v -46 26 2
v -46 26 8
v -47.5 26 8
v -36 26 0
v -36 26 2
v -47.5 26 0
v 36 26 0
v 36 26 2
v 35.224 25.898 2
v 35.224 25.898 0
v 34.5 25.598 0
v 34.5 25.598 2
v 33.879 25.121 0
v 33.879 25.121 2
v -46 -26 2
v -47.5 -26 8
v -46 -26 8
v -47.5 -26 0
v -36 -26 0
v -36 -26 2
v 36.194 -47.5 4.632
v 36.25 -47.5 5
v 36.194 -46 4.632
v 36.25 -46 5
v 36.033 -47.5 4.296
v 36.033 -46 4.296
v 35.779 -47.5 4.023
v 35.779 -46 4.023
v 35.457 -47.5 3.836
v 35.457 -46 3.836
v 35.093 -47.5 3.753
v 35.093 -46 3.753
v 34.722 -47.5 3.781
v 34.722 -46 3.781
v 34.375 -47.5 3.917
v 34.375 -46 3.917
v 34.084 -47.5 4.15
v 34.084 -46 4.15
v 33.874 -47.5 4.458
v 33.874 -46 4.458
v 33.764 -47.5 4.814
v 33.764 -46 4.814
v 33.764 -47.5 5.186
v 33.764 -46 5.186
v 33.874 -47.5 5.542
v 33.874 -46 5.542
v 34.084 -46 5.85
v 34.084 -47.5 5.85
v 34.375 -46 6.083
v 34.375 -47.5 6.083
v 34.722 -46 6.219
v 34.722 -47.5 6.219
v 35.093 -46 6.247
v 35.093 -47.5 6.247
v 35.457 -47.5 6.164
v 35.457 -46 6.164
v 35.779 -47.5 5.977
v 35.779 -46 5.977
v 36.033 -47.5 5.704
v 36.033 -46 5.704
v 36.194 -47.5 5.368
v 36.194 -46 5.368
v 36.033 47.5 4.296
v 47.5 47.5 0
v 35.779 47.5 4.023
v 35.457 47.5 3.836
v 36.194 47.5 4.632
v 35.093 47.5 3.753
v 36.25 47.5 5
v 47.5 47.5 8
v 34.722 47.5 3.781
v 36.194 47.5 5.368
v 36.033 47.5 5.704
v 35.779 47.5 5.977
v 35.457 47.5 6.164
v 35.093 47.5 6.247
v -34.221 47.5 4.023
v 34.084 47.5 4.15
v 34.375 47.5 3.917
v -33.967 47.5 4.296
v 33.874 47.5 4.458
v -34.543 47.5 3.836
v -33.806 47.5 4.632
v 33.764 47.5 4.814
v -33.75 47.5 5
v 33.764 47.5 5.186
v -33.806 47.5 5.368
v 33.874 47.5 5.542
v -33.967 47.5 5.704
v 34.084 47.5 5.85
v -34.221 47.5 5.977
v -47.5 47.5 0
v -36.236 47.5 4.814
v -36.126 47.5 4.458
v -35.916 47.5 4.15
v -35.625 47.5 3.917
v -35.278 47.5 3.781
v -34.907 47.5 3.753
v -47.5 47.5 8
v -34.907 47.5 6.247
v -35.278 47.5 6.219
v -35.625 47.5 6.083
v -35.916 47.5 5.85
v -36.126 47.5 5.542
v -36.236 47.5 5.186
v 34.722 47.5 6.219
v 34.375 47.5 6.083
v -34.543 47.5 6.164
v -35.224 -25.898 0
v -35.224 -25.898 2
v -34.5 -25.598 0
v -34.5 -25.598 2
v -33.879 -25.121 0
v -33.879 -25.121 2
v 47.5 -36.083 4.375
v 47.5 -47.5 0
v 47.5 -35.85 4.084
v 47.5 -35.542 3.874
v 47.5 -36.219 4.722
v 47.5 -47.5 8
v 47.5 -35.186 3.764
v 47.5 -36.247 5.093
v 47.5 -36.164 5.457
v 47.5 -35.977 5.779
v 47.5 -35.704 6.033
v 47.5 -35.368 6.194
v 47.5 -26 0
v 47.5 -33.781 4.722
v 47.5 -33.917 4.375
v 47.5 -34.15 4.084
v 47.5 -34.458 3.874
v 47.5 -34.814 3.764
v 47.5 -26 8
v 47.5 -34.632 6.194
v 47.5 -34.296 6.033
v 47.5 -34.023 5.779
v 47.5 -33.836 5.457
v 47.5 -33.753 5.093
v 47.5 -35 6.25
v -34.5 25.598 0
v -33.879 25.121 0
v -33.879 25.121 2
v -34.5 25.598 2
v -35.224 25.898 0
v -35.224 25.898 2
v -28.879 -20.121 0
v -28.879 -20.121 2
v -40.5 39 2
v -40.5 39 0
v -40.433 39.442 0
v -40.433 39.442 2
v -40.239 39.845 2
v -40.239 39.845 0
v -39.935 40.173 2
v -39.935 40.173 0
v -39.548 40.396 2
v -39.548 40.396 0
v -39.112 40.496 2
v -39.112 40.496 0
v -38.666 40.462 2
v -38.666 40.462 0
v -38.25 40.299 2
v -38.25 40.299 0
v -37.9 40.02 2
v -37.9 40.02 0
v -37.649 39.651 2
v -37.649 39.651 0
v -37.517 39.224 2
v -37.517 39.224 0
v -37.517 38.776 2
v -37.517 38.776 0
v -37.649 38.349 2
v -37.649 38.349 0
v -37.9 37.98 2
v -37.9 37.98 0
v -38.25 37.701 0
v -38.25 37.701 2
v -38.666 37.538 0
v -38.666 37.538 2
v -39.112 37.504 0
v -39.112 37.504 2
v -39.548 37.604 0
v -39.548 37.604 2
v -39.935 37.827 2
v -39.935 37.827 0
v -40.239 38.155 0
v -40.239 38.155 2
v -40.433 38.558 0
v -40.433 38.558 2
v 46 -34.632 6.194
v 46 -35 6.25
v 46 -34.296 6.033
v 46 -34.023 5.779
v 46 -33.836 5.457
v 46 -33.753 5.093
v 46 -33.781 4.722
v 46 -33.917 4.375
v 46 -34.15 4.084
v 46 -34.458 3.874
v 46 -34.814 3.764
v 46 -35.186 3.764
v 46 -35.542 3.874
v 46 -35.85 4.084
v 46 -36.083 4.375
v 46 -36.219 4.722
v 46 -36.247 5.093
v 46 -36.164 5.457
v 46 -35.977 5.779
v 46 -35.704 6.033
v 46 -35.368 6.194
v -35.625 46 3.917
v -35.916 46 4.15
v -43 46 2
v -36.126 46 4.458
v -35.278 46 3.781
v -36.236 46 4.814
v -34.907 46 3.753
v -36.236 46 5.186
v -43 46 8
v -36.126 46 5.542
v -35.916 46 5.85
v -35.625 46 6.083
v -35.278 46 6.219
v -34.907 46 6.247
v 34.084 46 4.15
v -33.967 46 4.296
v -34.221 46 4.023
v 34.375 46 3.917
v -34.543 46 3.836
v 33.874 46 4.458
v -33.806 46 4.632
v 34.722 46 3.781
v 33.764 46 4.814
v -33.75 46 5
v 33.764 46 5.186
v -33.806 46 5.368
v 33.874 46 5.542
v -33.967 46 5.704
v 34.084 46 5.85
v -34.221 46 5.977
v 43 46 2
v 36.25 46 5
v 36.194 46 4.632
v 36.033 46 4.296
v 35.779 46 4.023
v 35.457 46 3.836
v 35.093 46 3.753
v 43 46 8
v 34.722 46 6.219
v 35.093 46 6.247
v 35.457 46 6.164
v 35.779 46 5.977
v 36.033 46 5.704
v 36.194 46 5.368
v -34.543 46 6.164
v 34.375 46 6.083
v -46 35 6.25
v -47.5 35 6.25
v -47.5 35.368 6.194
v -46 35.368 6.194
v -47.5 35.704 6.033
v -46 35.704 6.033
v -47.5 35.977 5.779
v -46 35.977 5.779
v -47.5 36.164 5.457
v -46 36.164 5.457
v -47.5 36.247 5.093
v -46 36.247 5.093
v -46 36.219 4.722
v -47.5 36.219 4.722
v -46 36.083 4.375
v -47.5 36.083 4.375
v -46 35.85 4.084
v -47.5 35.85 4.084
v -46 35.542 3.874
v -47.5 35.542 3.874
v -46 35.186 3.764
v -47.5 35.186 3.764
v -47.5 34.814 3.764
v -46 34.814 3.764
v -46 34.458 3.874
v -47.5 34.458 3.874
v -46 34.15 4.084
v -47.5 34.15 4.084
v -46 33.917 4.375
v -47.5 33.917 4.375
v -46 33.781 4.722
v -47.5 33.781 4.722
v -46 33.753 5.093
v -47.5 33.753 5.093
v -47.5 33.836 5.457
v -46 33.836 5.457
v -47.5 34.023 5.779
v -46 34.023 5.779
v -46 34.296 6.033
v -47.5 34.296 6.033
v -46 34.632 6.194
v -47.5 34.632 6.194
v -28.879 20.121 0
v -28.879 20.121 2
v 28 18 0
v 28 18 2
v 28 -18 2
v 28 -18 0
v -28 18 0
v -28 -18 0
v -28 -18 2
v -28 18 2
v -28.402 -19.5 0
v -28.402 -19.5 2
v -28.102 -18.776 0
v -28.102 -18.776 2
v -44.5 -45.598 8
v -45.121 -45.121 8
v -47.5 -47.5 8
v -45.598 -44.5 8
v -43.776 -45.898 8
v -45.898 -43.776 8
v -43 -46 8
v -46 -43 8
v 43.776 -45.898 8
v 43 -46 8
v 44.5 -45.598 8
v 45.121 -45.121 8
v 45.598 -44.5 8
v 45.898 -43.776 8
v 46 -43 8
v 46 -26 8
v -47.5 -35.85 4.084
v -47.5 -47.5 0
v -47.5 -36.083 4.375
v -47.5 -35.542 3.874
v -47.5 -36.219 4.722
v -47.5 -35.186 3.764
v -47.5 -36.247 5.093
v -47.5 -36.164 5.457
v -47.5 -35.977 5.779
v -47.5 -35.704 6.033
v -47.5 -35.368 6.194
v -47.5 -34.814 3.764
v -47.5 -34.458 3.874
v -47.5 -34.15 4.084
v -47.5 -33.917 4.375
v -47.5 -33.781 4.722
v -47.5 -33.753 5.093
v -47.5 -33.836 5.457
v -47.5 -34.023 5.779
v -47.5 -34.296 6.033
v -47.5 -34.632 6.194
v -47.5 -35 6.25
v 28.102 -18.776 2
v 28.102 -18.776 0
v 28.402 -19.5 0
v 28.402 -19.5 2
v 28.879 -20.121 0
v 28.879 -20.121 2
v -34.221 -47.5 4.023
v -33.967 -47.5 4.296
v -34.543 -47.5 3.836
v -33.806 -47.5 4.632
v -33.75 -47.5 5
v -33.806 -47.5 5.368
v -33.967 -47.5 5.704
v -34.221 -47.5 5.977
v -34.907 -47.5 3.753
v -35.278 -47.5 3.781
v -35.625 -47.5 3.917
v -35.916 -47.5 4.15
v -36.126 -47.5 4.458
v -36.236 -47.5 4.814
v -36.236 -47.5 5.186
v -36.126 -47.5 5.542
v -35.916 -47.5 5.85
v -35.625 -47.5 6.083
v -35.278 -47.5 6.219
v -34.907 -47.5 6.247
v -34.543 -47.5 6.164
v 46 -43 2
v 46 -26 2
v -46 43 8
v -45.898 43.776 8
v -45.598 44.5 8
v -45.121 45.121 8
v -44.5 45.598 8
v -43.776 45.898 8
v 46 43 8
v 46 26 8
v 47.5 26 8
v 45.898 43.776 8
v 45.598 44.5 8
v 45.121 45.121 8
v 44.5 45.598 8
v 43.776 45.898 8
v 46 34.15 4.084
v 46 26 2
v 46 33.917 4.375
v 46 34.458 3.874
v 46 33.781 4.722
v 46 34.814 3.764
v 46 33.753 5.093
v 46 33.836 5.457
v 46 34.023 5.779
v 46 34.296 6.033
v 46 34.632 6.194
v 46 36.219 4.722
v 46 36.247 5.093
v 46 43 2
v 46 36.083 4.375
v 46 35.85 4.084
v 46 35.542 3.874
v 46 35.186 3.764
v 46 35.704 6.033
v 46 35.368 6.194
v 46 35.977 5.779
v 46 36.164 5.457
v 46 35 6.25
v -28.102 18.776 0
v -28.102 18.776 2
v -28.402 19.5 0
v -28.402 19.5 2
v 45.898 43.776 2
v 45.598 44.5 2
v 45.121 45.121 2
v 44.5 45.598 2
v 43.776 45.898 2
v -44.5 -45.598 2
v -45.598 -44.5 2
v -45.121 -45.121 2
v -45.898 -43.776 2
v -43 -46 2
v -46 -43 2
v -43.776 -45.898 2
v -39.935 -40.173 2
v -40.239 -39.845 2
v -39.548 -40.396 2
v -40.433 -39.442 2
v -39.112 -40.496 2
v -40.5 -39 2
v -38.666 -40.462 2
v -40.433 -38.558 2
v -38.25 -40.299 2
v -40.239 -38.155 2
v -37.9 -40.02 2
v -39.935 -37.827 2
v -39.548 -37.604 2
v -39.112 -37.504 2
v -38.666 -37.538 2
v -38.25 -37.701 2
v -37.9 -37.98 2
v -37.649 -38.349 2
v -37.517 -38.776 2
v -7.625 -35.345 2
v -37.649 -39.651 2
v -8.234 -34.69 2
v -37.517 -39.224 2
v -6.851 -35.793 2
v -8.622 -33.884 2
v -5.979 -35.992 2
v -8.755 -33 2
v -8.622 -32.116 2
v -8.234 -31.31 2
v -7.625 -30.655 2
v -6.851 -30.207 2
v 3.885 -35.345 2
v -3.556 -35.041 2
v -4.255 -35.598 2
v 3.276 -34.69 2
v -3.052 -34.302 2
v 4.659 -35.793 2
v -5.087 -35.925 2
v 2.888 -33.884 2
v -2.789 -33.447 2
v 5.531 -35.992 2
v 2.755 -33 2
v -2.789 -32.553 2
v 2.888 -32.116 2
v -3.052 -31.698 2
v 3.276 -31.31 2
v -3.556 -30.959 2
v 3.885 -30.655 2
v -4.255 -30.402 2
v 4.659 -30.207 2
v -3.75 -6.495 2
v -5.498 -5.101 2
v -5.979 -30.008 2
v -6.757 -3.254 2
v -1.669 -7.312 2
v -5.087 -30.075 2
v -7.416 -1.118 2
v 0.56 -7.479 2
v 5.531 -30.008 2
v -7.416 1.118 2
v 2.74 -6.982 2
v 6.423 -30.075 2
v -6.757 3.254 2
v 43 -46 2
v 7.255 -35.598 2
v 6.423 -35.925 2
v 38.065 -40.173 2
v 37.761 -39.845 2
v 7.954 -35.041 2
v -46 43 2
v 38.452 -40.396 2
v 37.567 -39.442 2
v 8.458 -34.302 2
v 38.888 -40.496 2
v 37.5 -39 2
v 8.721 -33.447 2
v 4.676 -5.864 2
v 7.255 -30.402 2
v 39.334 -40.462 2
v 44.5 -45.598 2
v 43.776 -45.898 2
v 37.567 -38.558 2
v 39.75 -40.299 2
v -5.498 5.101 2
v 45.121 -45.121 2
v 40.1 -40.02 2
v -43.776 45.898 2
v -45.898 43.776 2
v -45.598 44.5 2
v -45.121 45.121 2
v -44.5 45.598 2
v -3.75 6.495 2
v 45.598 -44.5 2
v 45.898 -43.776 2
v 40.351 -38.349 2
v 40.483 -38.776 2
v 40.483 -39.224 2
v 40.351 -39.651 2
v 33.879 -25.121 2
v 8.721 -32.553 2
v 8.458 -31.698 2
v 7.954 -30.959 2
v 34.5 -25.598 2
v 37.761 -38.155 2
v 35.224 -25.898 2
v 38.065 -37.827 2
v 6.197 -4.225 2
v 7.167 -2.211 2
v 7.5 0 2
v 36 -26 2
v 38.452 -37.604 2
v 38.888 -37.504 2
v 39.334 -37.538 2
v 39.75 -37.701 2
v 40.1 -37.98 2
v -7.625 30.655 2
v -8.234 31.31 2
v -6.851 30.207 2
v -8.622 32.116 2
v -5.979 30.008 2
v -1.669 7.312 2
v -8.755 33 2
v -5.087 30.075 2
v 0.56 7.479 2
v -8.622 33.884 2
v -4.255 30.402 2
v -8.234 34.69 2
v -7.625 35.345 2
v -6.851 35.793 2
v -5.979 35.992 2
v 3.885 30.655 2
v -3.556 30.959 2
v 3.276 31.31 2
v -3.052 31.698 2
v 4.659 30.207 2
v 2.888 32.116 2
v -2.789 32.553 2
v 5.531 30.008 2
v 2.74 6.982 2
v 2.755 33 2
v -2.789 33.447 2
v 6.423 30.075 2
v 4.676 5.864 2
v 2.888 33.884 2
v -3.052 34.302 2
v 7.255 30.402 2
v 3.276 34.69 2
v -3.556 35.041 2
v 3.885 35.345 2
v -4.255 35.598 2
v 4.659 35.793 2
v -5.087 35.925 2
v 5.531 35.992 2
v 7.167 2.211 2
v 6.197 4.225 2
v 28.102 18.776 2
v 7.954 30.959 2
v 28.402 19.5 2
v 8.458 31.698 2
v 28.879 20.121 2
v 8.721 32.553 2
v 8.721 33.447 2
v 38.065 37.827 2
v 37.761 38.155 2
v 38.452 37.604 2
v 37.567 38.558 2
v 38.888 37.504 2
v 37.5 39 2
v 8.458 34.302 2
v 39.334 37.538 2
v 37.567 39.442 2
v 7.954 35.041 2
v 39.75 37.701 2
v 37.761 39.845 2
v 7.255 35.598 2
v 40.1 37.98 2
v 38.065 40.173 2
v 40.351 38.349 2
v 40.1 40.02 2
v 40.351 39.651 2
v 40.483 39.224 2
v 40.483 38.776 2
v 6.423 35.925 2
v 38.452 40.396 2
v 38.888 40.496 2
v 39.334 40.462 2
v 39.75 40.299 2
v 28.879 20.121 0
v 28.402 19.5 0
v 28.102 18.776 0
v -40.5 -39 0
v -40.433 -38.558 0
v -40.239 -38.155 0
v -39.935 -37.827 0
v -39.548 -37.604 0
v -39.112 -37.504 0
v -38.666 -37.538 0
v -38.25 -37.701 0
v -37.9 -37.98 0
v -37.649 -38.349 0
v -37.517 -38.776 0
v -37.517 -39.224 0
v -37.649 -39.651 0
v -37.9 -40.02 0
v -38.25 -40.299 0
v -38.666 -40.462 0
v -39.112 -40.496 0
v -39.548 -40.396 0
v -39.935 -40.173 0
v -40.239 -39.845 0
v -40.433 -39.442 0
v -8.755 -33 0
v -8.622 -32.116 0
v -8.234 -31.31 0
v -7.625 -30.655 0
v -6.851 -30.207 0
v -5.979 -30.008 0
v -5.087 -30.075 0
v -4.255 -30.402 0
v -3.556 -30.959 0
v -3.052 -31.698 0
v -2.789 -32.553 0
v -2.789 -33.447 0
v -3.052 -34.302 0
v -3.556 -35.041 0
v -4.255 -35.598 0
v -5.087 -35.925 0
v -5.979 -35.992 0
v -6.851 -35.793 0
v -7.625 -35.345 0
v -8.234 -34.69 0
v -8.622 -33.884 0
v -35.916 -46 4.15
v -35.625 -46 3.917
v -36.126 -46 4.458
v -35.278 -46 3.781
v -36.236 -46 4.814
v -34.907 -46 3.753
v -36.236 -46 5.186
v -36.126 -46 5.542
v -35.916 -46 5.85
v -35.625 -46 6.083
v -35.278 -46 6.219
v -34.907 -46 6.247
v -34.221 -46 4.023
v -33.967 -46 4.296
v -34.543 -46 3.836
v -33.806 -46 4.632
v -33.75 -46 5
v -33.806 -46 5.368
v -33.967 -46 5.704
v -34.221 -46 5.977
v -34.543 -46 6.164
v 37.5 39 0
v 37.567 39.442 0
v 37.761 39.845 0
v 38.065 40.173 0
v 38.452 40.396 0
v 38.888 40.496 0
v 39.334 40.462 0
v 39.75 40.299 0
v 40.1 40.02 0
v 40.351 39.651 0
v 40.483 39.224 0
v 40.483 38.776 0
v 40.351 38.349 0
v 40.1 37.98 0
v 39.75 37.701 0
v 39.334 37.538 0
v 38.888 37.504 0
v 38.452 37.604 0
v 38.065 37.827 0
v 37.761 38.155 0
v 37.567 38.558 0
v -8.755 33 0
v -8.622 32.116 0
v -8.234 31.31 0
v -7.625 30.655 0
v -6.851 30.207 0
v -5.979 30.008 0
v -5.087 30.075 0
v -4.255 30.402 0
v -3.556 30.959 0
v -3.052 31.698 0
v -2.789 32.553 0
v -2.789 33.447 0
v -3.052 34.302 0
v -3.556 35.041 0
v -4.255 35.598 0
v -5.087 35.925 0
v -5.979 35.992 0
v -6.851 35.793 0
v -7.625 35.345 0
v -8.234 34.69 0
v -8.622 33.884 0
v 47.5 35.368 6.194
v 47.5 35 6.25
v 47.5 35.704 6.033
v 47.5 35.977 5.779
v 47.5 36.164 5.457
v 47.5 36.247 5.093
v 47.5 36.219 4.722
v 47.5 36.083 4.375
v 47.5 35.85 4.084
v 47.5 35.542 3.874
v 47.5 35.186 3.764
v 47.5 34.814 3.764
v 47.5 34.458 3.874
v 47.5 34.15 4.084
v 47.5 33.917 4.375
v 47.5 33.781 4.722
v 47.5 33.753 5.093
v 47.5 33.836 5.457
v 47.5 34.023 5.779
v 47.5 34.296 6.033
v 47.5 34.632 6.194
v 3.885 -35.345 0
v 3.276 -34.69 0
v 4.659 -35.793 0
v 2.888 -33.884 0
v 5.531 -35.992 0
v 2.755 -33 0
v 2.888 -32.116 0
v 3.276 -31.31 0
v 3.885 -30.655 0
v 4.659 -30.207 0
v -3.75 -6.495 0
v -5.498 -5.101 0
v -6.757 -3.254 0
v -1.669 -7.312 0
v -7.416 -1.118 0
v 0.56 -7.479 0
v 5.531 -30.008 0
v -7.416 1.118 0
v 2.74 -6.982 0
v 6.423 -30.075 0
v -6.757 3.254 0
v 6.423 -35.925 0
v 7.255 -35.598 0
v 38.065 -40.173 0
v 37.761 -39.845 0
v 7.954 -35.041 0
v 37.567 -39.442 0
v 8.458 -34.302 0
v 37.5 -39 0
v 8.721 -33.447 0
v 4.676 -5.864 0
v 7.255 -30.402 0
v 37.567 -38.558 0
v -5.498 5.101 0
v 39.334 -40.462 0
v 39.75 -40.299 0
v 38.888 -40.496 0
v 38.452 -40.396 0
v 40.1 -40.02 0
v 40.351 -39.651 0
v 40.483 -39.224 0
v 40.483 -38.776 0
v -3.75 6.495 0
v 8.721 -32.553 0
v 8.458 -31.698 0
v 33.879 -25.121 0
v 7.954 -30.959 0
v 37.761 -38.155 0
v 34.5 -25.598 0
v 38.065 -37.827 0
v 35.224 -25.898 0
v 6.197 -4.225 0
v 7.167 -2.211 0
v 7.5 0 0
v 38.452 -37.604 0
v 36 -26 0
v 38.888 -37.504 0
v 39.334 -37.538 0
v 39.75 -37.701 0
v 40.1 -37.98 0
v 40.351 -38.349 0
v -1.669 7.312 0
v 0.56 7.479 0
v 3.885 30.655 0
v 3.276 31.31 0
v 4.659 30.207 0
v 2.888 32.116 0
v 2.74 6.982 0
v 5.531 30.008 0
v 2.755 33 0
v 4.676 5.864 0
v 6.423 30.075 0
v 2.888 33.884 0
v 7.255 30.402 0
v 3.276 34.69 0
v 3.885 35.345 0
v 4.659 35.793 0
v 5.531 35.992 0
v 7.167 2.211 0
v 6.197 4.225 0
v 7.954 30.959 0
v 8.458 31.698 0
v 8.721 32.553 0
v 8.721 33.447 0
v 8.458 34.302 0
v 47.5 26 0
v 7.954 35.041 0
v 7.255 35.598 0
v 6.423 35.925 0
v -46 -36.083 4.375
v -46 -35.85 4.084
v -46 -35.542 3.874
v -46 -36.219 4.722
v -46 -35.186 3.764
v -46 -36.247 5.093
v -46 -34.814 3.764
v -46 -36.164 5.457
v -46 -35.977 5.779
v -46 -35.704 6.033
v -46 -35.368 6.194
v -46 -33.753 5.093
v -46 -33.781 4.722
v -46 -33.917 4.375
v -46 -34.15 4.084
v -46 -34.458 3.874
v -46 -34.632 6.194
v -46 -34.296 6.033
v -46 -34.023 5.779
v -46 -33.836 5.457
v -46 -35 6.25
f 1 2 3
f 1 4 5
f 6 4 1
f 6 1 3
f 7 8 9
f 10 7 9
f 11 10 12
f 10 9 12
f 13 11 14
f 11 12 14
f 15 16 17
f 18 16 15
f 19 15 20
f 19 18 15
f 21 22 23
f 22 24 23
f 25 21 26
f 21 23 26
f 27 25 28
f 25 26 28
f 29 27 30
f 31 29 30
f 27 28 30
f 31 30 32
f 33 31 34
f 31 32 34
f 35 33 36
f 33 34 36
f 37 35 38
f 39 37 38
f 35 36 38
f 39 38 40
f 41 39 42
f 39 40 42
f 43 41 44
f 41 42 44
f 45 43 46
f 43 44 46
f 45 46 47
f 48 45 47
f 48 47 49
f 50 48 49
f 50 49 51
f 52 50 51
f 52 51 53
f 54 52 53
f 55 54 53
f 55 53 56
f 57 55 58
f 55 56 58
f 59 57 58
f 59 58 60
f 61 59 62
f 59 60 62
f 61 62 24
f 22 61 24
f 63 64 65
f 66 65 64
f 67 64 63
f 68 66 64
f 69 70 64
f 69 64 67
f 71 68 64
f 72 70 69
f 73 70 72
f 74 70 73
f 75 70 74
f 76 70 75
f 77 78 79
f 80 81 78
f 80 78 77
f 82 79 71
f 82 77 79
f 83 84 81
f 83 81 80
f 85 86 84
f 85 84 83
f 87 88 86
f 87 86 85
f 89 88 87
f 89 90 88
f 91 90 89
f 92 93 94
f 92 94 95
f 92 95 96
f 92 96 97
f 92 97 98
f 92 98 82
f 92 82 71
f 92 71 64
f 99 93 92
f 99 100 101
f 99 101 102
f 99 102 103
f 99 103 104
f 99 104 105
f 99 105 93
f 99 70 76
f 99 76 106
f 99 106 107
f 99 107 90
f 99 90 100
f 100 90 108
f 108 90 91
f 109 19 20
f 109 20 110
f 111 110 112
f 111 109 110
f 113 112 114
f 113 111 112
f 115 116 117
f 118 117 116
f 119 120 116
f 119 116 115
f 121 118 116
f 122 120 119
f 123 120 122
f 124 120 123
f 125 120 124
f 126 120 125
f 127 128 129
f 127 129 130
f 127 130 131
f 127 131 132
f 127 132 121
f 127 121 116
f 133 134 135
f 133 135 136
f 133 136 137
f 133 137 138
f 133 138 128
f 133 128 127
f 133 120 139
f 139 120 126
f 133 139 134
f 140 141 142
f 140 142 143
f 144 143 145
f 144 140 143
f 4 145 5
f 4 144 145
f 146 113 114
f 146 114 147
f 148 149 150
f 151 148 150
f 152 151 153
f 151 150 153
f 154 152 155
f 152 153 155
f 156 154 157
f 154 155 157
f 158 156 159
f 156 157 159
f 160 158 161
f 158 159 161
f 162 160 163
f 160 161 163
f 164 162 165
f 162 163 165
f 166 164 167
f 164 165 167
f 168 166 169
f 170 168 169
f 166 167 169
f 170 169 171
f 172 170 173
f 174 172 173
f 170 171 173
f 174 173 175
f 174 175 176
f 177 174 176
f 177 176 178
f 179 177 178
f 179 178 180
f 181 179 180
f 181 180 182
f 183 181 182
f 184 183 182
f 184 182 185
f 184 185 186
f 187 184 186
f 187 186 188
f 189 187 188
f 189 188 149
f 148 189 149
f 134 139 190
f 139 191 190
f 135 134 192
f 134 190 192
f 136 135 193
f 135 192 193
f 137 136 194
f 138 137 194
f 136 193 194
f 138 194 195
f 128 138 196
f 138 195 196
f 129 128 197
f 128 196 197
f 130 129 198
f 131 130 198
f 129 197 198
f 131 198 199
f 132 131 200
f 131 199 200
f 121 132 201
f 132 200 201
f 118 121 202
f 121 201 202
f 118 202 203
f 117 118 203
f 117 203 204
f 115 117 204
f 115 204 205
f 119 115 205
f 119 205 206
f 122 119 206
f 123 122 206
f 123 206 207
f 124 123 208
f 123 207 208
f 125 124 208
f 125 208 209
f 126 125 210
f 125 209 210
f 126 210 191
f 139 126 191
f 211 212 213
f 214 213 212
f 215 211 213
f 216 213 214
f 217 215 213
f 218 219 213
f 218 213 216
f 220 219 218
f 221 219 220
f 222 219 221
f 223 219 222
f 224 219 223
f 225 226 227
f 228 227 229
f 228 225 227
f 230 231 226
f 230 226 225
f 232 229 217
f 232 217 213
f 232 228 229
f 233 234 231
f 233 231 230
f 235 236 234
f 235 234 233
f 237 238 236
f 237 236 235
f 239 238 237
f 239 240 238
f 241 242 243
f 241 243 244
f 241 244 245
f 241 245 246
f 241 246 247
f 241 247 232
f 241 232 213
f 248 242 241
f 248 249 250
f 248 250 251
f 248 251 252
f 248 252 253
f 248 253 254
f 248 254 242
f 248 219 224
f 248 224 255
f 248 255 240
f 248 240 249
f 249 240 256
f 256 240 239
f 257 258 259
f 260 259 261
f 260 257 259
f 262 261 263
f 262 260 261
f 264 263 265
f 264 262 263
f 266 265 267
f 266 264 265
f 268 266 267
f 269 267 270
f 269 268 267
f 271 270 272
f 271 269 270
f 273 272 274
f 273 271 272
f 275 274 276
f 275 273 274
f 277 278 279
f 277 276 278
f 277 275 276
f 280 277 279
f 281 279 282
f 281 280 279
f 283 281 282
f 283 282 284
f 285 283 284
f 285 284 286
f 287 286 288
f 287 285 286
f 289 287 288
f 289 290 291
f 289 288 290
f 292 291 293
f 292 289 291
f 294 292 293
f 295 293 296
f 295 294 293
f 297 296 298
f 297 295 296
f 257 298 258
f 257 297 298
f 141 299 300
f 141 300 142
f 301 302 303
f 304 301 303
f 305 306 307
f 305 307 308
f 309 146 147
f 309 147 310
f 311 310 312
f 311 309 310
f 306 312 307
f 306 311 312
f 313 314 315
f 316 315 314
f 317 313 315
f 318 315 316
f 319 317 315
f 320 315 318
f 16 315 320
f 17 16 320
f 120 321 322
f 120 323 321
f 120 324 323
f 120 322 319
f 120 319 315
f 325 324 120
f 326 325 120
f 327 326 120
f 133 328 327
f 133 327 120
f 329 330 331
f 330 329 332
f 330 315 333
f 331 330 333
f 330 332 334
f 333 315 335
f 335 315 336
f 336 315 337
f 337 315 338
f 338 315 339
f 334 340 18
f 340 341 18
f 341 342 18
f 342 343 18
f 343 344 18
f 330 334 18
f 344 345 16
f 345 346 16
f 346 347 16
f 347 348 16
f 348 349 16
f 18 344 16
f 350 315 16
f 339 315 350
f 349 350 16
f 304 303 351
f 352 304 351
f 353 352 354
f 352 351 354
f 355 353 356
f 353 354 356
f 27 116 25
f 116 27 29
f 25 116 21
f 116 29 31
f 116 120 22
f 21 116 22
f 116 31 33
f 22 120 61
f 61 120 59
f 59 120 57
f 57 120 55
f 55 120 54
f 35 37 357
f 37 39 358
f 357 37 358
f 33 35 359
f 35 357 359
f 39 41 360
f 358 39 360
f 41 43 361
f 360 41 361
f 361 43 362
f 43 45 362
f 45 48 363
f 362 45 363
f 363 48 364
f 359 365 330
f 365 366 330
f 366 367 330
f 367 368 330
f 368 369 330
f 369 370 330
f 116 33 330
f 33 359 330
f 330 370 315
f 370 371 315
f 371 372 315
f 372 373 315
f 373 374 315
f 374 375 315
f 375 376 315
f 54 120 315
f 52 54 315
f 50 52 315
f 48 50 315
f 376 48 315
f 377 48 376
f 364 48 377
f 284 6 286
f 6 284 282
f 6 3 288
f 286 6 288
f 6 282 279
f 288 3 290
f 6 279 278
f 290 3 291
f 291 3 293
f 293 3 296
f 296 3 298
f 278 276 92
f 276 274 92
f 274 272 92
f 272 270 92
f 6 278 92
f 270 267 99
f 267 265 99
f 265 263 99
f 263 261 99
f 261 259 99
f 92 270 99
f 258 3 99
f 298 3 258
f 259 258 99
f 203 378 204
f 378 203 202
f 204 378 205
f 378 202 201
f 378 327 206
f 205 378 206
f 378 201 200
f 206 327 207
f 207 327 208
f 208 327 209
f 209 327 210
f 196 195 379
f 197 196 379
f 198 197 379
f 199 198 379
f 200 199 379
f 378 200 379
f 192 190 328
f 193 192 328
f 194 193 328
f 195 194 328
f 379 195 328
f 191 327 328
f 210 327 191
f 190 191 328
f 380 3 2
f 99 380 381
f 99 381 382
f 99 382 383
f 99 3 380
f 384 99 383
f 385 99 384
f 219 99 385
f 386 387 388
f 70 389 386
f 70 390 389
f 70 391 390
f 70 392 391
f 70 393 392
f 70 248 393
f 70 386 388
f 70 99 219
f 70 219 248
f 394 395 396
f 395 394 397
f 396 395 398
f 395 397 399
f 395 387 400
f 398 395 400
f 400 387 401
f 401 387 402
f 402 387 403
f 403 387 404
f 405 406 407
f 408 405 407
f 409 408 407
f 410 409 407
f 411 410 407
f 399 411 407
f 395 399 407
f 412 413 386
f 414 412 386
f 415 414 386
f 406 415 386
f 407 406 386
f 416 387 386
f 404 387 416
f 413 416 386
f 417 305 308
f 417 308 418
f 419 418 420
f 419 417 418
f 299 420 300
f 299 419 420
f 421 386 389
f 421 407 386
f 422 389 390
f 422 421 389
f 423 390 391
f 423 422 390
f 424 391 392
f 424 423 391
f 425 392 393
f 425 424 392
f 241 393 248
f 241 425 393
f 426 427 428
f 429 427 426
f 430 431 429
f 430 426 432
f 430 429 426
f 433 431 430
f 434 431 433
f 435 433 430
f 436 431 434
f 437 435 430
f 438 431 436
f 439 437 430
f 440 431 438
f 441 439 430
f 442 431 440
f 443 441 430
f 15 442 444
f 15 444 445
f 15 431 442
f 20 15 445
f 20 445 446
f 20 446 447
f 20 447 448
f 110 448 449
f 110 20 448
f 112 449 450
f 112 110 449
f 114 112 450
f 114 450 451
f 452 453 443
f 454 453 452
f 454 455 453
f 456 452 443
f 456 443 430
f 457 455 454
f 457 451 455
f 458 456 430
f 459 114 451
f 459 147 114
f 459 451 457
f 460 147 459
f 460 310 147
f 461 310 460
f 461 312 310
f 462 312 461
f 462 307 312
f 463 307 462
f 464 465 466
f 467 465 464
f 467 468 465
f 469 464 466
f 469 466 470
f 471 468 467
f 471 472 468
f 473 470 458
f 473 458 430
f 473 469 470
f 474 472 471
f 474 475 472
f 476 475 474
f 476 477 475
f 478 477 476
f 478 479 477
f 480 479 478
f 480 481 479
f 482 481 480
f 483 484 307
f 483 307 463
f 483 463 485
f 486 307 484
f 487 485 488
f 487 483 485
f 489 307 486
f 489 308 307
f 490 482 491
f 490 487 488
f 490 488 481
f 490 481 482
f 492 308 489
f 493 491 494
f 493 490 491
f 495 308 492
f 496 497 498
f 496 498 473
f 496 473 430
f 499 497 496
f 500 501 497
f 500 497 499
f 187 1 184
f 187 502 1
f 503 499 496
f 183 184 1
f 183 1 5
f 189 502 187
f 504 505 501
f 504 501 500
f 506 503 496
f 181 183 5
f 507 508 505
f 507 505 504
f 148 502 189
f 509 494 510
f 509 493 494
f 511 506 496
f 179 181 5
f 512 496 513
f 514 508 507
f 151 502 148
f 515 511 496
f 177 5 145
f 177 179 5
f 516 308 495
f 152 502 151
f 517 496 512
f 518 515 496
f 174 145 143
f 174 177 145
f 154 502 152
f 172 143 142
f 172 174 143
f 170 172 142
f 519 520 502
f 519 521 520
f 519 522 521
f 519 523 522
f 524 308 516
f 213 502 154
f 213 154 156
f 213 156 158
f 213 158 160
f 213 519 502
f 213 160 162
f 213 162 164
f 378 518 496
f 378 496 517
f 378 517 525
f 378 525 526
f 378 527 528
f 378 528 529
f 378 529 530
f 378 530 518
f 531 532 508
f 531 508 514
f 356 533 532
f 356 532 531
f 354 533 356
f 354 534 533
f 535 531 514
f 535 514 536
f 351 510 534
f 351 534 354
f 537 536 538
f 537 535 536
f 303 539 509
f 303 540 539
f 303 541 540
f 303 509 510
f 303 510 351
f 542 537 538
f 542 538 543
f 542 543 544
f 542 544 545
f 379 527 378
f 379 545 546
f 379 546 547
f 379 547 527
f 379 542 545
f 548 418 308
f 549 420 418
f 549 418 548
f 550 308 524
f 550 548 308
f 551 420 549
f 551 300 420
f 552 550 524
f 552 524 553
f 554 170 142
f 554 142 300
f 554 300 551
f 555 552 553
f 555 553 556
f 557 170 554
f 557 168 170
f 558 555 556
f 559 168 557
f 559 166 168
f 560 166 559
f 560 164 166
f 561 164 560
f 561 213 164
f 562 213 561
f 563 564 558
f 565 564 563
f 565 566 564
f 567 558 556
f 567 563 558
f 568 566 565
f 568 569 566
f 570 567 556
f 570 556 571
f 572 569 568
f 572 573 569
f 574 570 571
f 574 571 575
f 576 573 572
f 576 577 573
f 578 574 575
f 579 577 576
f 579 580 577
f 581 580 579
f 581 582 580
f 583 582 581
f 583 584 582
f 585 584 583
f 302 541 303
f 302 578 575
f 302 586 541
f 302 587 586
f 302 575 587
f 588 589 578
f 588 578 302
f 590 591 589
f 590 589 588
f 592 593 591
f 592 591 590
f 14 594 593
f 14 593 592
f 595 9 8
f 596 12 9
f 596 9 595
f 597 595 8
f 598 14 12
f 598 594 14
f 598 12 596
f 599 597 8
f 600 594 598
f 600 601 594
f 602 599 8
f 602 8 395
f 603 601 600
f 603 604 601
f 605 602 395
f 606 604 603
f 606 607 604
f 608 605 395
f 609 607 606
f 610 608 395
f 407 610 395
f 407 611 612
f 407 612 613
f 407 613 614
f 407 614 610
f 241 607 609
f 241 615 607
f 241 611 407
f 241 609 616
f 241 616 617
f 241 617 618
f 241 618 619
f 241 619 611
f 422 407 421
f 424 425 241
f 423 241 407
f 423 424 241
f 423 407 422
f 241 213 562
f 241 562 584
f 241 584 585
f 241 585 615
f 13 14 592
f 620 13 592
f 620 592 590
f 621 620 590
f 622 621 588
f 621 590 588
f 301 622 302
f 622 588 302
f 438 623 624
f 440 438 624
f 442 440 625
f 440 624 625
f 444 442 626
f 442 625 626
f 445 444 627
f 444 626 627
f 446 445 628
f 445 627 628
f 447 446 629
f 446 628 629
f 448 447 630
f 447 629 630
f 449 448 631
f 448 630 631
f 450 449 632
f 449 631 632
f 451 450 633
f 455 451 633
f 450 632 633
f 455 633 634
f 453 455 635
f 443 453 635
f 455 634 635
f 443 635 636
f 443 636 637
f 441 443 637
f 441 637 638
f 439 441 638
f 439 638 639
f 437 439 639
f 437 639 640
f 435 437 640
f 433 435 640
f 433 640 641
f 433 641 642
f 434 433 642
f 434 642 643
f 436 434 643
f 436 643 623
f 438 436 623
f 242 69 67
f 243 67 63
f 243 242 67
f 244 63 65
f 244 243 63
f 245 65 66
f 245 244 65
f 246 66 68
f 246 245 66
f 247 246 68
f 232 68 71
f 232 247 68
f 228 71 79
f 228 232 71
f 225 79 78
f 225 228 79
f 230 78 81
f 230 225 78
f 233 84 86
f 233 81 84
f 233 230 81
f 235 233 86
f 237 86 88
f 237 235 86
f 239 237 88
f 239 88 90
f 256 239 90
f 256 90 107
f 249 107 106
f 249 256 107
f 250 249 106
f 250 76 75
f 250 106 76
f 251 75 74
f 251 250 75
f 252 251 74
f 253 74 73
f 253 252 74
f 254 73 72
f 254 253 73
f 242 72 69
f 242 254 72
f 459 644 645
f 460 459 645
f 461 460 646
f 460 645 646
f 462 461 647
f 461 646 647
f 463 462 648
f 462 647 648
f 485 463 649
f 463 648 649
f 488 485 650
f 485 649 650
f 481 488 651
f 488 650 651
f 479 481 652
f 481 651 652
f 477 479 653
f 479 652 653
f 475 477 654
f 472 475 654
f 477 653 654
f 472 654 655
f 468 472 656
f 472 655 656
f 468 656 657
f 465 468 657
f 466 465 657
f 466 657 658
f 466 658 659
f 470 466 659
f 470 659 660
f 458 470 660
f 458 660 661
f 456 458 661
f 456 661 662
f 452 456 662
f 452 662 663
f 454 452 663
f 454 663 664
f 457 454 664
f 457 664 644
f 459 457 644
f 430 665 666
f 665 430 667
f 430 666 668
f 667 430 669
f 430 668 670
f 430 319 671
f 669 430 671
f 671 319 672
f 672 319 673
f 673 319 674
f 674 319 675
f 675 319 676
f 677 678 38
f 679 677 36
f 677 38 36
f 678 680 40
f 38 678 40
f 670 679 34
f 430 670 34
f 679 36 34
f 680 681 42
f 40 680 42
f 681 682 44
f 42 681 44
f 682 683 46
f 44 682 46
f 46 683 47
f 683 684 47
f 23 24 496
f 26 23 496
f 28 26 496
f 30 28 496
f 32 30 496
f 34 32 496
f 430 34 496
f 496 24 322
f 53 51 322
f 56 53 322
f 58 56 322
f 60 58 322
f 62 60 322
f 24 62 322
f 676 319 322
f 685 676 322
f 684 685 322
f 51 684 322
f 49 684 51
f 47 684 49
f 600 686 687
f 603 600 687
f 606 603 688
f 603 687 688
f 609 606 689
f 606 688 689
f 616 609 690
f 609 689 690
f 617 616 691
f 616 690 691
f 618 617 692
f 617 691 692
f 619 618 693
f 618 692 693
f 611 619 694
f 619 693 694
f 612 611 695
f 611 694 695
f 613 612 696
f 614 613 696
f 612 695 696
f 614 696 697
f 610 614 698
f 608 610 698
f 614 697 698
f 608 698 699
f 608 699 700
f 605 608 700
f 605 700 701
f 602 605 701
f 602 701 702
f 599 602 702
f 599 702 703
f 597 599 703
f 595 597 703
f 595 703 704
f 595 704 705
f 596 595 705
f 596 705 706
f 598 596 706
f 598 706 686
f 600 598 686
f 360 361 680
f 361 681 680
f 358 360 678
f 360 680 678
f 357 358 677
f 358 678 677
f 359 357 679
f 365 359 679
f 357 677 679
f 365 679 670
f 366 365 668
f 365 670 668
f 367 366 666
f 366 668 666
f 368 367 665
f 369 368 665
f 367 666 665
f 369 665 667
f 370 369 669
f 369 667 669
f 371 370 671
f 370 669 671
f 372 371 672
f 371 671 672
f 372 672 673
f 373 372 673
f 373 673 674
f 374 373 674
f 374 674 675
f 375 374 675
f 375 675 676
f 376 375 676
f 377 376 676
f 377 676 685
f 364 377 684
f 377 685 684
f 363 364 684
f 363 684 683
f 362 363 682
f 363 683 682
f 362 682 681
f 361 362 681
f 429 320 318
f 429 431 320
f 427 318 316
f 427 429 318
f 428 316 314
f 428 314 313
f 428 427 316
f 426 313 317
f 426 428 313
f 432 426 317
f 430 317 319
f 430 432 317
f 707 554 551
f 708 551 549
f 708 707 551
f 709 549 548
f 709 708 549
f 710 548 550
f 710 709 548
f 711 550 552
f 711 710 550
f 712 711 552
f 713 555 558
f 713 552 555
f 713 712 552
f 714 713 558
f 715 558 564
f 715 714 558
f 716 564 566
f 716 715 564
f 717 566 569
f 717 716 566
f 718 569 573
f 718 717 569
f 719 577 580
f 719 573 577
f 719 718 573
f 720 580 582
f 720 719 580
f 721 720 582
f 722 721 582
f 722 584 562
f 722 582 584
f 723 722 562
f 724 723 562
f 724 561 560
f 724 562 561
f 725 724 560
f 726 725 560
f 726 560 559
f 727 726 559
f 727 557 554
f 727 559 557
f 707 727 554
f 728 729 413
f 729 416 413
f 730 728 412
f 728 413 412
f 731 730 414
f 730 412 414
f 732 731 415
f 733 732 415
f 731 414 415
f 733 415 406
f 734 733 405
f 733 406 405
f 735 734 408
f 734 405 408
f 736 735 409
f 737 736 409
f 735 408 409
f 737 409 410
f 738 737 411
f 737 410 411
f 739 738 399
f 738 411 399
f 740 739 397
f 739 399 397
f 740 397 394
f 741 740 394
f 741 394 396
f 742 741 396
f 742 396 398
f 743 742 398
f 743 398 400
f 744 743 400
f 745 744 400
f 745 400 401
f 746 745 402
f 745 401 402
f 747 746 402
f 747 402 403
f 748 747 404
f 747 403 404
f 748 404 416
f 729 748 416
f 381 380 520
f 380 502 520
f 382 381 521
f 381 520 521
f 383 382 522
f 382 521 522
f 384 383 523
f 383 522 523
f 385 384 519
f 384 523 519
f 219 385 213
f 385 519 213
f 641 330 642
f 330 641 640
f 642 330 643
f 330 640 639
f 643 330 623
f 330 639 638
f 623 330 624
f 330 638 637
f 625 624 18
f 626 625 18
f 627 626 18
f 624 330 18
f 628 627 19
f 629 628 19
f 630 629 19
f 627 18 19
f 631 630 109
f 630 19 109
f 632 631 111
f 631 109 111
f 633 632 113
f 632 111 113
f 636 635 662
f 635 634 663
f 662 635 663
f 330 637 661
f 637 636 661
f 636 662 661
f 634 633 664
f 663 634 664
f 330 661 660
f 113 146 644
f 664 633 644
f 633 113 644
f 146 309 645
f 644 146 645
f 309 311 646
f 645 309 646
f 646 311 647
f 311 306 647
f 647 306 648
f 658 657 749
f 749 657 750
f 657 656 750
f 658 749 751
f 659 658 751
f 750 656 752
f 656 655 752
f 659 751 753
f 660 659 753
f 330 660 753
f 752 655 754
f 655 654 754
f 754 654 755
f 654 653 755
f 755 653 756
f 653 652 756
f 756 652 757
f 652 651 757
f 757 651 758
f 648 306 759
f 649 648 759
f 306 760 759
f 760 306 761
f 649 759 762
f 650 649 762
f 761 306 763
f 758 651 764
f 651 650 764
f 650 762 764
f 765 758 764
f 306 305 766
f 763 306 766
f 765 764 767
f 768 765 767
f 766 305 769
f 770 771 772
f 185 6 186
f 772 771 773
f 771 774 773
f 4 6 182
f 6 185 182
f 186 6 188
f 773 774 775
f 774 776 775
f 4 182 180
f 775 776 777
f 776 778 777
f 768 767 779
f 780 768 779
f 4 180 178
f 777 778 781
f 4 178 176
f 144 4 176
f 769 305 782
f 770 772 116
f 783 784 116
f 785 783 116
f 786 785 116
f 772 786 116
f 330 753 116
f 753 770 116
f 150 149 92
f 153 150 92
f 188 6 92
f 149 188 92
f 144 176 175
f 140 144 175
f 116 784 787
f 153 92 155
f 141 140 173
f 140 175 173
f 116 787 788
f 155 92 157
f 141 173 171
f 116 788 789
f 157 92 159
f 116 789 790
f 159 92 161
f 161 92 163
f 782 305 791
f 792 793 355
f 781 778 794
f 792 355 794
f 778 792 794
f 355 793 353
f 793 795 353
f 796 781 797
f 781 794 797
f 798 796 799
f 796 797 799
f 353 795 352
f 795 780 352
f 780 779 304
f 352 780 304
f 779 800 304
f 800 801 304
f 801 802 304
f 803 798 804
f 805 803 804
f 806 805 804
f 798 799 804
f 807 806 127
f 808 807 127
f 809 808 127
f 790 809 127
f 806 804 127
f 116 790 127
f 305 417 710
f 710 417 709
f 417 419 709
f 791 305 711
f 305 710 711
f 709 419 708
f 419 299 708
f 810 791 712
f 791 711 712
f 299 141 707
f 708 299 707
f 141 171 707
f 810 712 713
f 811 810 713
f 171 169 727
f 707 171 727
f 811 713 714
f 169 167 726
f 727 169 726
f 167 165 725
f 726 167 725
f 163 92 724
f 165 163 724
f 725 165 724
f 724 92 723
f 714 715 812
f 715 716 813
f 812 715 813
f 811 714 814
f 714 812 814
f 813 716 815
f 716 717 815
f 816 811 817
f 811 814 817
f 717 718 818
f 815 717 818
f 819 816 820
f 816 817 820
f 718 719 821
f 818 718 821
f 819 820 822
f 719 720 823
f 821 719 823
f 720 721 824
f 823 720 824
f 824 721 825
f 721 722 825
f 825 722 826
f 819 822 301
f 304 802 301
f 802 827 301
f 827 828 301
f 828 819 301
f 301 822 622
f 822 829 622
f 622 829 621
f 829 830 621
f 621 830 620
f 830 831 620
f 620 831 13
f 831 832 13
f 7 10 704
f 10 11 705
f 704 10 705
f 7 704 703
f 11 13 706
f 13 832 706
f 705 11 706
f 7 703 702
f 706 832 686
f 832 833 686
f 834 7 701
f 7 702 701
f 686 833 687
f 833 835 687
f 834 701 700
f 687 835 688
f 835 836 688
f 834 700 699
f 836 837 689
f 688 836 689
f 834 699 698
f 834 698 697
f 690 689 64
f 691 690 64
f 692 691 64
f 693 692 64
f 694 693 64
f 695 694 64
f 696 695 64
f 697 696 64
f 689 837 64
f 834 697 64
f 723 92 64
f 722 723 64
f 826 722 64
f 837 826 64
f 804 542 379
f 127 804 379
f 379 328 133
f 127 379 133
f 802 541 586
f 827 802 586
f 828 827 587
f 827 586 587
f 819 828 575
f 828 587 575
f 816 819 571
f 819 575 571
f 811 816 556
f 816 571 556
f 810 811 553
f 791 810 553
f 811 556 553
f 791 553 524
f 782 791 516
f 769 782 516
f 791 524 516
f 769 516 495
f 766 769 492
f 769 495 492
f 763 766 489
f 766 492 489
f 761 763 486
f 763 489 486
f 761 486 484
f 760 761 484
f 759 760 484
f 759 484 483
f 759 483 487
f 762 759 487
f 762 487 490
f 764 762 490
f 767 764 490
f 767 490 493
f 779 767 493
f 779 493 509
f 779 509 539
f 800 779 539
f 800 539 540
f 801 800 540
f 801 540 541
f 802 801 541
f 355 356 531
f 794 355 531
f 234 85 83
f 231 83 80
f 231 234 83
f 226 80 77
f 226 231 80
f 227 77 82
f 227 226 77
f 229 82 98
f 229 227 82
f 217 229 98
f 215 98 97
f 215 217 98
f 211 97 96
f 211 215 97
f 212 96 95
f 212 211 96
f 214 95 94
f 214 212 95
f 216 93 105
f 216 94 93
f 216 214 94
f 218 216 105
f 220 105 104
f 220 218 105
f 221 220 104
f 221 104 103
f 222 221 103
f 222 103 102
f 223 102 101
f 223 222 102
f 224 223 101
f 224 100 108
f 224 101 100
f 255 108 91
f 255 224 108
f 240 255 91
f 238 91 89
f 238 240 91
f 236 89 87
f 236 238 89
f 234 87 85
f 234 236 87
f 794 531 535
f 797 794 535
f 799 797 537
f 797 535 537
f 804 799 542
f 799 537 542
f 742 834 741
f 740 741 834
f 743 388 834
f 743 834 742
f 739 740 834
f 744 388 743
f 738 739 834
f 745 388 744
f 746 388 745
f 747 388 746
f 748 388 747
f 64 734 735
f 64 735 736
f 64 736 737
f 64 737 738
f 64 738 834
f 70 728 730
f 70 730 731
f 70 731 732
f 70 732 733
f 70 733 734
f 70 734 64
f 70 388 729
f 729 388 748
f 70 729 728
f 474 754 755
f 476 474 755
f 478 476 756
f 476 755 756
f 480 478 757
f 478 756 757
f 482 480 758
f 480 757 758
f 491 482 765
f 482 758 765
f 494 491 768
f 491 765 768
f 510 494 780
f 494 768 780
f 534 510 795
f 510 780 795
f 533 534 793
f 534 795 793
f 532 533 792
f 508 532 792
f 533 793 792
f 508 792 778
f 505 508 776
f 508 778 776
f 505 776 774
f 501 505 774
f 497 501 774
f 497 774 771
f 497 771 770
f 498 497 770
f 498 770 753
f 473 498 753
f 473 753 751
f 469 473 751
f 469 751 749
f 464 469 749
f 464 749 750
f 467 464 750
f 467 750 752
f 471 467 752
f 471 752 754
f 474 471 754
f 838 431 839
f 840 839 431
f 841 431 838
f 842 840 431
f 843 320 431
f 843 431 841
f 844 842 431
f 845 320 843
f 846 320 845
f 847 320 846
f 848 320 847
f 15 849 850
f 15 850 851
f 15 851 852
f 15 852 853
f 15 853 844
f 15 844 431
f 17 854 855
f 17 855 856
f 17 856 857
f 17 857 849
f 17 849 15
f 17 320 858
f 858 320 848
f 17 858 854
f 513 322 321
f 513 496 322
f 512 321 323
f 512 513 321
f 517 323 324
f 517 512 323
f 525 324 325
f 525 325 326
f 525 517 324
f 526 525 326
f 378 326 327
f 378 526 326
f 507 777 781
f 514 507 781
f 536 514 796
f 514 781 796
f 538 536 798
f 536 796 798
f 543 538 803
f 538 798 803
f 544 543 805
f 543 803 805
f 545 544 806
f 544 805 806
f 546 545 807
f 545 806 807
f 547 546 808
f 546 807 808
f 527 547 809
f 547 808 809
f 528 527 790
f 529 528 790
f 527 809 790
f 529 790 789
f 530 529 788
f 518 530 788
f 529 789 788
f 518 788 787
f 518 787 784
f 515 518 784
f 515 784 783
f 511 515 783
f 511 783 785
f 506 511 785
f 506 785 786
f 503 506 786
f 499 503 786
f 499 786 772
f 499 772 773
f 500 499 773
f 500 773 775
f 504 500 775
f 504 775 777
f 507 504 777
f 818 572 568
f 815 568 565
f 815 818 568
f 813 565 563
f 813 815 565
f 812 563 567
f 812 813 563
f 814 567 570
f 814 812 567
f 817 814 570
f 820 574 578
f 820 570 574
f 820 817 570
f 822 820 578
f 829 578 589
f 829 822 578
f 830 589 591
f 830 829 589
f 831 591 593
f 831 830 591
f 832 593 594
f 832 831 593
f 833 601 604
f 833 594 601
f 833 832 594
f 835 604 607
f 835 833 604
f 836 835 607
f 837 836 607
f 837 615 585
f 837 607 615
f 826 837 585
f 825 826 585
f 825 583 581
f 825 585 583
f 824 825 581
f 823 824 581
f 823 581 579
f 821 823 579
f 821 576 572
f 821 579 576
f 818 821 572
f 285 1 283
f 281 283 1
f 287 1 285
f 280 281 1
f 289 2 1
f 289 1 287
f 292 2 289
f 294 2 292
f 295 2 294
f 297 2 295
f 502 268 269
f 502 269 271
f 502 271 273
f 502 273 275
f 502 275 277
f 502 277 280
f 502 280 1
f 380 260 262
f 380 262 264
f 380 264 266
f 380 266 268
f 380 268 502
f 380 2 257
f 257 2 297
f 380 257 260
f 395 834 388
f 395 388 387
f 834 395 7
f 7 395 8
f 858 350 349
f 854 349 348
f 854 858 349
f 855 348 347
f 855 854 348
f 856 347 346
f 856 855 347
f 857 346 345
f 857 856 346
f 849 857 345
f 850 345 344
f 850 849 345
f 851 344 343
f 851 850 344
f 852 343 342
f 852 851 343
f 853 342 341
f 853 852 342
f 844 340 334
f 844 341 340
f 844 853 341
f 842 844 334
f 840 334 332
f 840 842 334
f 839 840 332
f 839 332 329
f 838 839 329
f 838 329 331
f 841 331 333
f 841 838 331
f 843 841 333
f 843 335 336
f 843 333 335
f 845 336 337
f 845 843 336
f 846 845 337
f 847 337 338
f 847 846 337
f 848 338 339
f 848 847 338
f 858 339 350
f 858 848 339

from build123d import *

# Parameters (mm, degrees)
SKETCH1_W                       = 96
SKETCH1_H                       = 96
BOSS_EXTRUDE1_DEPTH             = 8
SKETCH2_W                       = 92
SKETCH2_H                       = 92
COMPONENT_PLATFORM_DEPTH        = 6
CABLE_SLOTS_DEPTH               = 6
SKETCH4_R                       = 7.5
CENTER_MASS_CUT_DEPTH           = 6
INNER_CORNER_FILLETS_R          = 3
TAP_DRILL_FOR_M3X0_5_TAP1_D     = 2.5
TAP_DRILL_FOR_M3X0_5_TAP1_DEPTH = 2
TAP_DRILL_FOR_M3X0_5_TAP2_D     = 2.5
TAP_DRILL_FOR_M3X0_5_TAP2_DEPTH = 2
F_3_0MM_DOWEL_HOLE3_D           = 3
F_3_0MM_DOWEL_HOLE3_DEPTH       = 10
F_3_0MM_DOWEL_HOLE3_TIP         = 0.901290929
CUT_EXTRUDE1_START              = -8
SKETCH16_OUTSIDE_W              = 125.2
SKETCH16_OUTSIDE_H              = 125.2
SKETCH16_OUTSIDE_W_2            = 95
SKETCH16_OUTSIDE_H_2            = 95
CUT_EXTRUDE1_DEPTH              = 8
SKETCH17_R                      = 3
CUT_EXTRUDE3_DEPTH              = 9


with BuildPart() as part:
    # Sketch1 → Boss-Extrude1 (new body)
    with BuildSketch(Plane.XY):
        Rectangle(SKETCH1_W, SKETCH1_H)
    extrude(amount=BOSS_EXTRUDE1_DEPTH)

    # Sketch2 → Component Platform (cut)
    with BuildSketch(Plane.XY.offset(8)):
        Rectangle(SKETCH2_W, SKETCH2_H)
    extrude(amount=-COMPONENT_PLATFORM_DEPTH, mode=Mode.SUBTRACT)

    # Sketch3 → Cable Slots (cut, symmetric)
    with BuildSketch(Plane.XY.offset(2)):
        with BuildLine():
            Line((-33.878679656, -25.121320344), (-28.878679656, -20.121320344))
            ThreePointArc((-28.878679656, -20.121320344), (-28.228361402, -19.148050297), (-28, -18))
            Line((-28, -18), (-28, 18))
            ThreePointArc((-28, 18), (-28.228361402, 19.148050297), (-28.878679656, 20.121320344))
            Line((-28.878679656, 20.121320344), (-33.878679656, 25.121320344))
            ThreePointArc((-33.878679656, 25.121320344), (-34.851949703, 25.771638598), (-36, 26))
            Line((-36, 26), (-48, 26))
            Line((-48, 26), (-48, -26))
            Line((-48, -26), (-36, -26))
            ThreePointArc((-36, -26), (-34.851949703, -25.771638598), (-33.878679656, -25.121320344))
        make_face()
        with BuildLine():
            Line((48, -26), (48, 26))
            Line((48, 26), (36, 26))
            ThreePointArc((36, 26), (34.851949703, 25.771638598), (33.878679656, 25.121320344))
            Line((33.878679656, 25.121320344), (28.878679656, 20.121320344))
            ThreePointArc((28.878679656, 20.121320344), (28.228361402, 19.148050297), (28, 18))
            Line((28, 18), (28, -18))
            ThreePointArc((28, -18), (28.228361402, -19.148050297), (28.878679656, -20.121320344))
            Line((28.878679656, -20.121320344), (33.878679656, -25.121320344))
            ThreePointArc((33.878679656, -25.121320344), (34.851949703, -25.771638598), (36, -26))
            Line((36, -26), (48, -26))
        make_face()
    extrude(amount=CABLE_SLOTS_DEPTH, both=True, mode=Mode.SUBTRACT)

    # Sketch4 → Center Mass Cut (cut)
    with BuildSketch(Plane.XY.offset(2)):
        Circle(SKETCH4_R)
    extrude(amount=-CENTER_MASS_CUT_DEPTH, mode=Mode.SUBTRACT)

    # Inner Corner Fillets
    inner_corner_fillets_edges = [part.edges().sort_by_distance(p)[0] for p in [
        (-46, -46, 5),
        (-46, 46, 5),
        (46, 46, 5),
        (46, -46, 5),
    ]]
    fillet(inner_corner_fillets_edges, radius=INNER_CORNER_FILLETS_R)

    # Tap Drill for M3x0.5 Tap1
    with Locations(Plane(origin=(0, -48, 0), x_dir=(-1, 0, 0), z_dir=(0, -1, 0))):
        with Locations((35, -5), (-35, -5)):
            tap_drill_for_m3x0_5_tap1 = Hole(TAP_DRILL_FOR_M3X0_5_TAP1_D / 2, depth=TAP_DRILL_FOR_M3X0_5_TAP1_DEPTH)

    # Tap Drill for M3x0.5 Tap2
    with Locations(Plane(origin=(48, 0, 0), x_dir=(0, 0, -1), z_dir=(1, 0, 0))):
        with Locations((-5, -35), (-5, 35)):
            tap_drill_for_m3x0_5_tap2 = Hole(TAP_DRILL_FOR_M3X0_5_TAP2_D / 2, depth=TAP_DRILL_FOR_M3X0_5_TAP2_DEPTH)

    # Mirror1: Tap Drill for M3x0.5 Tap1 across plane
    add(tap_drill_for_m3x0_5_tap1.mirror(Plane(origin=(0, 0, 0), x_dir=(0, 0, 1), z_dir=(0, -1, 0))), mode=Mode.SUBTRACT)

    # Mirror2: Tap Drill for M3x0.5 Tap2 across plane
    add(tap_drill_for_m3x0_5_tap2.mirror(Plane(origin=(0, 0, 0), x_dir=(0, 0, 1), z_dir=(1, 0, 0))), mode=Mode.SUBTRACT)

    # Ø3.0mm Dowel Hole3
    with Locations(Plane.XY.offset(2)):
        with Locations((-39, -39), (39, -39), (39, 39), (-39, 39)):
            Hole(F_3_0MM_DOWEL_HOLE3_D / 2, depth=F_3_0MM_DOWEL_HOLE3_DEPTH)
            with Locations((0, 0, -(F_3_0MM_DOWEL_HOLE3_DEPTH + F_3_0MM_DOWEL_HOLE3_TIP / 2))):  # 118° drill point
                Cone(0, F_3_0MM_DOWEL_HOLE3_D / 2, F_3_0MM_DOWEL_HOLE3_TIP, mode=Mode.SUBTRACT)

    # Sketch16 outside → Cut-Extrude1 (cut)
    with BuildSketch(Plane(origin=(0, 0, 0), x_dir=(-1, 0, 0), z_dir=(0, 0, -1)).offset(CUT_EXTRUDE1_START)):
        Rectangle(SKETCH16_OUTSIDE_W, SKETCH16_OUTSIDE_H)
        Rectangle(SKETCH16_OUTSIDE_W_2, SKETCH16_OUTSIDE_H_2, mode=Mode.SUBTRACT)
    extrude(amount=CUT_EXTRUDE1_DEPTH, mode=Mode.SUBTRACT)

    # Sketch17 → Cut-Extrude3 (cut, through all)
    with BuildSketch(Plane(origin=(0, 0, 0), x_dir=(-1, 0, 0), z_dir=(0, 0, -1))):
        with Locations((-5.755, -32.99999626)):
            Circle(SKETCH17_R)
        with Locations((5.755, -32.99999626)):
            Circle(SKETCH17_R)
    cut_extrude3 = extrude(amount=-CUT_EXTRUDE3_DEPTH, mode=Mode.SUBTRACT)

    # Mirror4: Cut-Extrude3 across plane
    add(cut_extrude3.mirror(Plane(origin=(0, 0, 0), x_dir=(0, 0, 1), z_dir=(0, -1, 0))), mode=Mode.SUBTRACT)


solid = part.part
